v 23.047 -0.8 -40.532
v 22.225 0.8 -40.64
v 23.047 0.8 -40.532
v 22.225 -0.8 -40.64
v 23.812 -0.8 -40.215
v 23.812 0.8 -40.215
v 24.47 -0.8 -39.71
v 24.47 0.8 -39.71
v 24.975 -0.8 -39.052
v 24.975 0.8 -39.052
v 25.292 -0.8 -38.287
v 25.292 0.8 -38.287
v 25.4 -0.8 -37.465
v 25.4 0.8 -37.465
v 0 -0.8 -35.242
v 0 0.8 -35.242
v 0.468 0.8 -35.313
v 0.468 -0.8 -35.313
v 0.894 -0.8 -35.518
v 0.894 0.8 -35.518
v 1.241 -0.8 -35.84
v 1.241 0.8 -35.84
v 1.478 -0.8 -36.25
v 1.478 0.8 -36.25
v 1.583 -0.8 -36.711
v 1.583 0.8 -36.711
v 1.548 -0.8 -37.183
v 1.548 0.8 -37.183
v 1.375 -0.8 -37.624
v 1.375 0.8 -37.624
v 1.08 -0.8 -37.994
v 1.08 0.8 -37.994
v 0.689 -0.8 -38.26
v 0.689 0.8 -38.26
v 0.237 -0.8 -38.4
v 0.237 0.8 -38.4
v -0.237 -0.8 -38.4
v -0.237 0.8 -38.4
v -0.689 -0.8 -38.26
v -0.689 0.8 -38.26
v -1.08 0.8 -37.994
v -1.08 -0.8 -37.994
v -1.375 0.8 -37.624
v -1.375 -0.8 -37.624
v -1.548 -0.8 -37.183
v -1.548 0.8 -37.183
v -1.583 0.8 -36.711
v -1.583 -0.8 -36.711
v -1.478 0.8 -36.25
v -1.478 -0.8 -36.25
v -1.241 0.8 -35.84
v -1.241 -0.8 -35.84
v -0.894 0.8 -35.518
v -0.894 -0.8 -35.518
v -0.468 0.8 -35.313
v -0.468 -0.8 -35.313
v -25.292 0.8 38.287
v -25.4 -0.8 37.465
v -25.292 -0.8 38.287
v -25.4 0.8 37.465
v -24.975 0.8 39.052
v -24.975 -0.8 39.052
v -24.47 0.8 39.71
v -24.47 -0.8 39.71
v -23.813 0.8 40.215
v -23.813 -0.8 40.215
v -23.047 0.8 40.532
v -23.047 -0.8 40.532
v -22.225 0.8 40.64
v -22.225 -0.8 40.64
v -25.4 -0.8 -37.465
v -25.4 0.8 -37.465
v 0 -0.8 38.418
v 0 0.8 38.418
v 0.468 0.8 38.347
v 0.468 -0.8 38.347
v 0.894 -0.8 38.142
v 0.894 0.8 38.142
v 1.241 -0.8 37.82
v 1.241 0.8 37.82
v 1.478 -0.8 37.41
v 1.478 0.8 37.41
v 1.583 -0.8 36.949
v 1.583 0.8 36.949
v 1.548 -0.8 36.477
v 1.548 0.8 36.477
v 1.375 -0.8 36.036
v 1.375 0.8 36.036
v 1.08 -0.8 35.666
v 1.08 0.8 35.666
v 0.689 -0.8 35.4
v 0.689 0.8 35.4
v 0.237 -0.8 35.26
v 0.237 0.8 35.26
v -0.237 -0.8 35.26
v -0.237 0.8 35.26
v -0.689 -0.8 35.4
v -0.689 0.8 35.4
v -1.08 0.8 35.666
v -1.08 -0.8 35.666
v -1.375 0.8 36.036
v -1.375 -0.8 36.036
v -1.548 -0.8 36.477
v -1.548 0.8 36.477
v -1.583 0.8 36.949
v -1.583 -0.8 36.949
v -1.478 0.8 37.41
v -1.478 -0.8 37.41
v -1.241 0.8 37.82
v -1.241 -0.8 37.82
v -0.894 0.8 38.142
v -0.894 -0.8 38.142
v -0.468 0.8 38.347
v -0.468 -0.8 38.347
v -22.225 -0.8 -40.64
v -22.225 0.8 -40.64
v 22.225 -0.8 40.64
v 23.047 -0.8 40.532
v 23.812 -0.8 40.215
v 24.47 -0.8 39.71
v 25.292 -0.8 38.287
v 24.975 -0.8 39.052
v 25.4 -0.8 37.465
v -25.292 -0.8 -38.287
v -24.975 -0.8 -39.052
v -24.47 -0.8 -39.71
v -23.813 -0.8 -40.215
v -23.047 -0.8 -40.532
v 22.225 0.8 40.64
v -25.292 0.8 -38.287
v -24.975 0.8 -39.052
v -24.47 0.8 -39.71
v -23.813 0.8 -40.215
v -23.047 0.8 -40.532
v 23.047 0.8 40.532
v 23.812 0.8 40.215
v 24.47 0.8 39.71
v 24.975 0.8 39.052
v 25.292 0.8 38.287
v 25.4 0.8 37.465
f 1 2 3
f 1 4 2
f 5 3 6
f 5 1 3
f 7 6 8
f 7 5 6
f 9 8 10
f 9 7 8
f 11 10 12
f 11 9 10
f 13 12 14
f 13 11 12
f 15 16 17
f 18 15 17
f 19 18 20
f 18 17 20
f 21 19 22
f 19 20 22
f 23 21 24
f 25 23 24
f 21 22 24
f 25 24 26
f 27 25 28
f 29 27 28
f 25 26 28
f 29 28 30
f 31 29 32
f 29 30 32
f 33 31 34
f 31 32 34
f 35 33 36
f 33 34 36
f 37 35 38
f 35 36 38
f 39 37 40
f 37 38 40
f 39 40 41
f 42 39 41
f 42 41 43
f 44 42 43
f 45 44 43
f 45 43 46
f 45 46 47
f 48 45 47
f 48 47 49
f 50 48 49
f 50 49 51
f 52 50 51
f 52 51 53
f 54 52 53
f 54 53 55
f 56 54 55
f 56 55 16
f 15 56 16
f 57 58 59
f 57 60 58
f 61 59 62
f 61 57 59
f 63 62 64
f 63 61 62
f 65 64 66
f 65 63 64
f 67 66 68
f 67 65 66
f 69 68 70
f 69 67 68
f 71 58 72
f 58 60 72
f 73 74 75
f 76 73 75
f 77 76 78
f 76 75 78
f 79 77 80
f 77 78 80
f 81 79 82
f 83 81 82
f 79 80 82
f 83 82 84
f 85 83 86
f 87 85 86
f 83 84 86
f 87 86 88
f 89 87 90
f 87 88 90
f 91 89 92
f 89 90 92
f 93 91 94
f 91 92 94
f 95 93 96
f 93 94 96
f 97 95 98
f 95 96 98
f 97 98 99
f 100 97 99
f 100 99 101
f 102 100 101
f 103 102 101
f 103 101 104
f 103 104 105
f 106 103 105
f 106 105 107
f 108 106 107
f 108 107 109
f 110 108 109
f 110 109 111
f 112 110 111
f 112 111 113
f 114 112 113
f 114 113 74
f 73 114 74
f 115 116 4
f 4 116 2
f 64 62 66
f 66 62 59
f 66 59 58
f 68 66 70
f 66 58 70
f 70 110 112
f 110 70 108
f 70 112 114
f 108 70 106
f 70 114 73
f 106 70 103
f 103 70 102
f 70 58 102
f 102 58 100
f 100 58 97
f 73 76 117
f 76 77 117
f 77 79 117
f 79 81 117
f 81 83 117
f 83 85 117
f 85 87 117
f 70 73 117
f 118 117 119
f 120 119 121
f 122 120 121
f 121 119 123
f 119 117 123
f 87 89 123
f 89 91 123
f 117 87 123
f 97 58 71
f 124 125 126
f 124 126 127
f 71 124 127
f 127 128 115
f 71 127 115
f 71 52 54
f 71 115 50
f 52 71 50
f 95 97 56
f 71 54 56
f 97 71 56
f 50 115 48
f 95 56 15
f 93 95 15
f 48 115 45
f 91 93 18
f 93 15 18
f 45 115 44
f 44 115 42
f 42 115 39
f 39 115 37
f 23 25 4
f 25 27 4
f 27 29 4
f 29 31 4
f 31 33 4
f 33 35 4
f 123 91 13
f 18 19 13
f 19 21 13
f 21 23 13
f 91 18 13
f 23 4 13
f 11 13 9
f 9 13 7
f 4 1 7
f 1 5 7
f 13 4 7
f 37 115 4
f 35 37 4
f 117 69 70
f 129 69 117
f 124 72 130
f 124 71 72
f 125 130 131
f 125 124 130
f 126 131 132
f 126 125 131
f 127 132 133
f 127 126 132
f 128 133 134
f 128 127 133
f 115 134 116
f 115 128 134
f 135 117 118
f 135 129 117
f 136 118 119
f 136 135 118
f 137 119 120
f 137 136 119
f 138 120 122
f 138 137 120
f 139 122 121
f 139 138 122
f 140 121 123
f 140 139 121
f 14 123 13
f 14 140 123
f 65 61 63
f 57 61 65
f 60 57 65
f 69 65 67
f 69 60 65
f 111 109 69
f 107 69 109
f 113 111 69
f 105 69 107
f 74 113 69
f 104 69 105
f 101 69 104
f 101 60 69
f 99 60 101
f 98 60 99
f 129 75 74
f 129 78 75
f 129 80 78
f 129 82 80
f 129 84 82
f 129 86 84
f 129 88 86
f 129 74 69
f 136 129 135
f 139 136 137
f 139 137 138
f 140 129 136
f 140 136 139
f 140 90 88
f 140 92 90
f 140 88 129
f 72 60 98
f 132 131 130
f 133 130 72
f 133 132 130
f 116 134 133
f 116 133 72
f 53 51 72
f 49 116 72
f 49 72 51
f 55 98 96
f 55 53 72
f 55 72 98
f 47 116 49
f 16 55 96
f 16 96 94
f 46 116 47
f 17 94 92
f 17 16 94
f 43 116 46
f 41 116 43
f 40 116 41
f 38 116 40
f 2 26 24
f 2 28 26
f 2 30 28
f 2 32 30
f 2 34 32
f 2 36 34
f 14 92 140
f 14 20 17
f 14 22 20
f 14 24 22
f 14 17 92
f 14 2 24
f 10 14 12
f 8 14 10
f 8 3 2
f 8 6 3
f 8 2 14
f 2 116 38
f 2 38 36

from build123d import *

# Parameters (mm, degrees)
SKETCH1_W           = 50.8
SKETCH1_H           = 81.28
BOSS_EXTRUDE1_DEPTH = 0.8001
SKETCH2_R           = 1.5875
CUT_EXTRUDE1_DEPTH  = 48.951331994
FILLET1_R           = 3.175


with BuildPart() as part:
    # Sketch1 → Boss-Extrude1 (new, symmetric)
    with BuildSketch(Plane(origin=(0, 0, 0), x_dir=(1, 0, 0), z_dir=(0, 1, 0))):
        Rectangle(SKETCH1_W, SKETCH1_H)
    extrude(amount=BOSS_EXTRUDE1_DEPTH, both=True)

    # Sketch2 → Cut-Extrude1 (cut, through all)
    with BuildSketch(Plane(origin=(0, 0.8001, 0), x_dir=(1, 0, 0), z_dir=(0, 1, 0))):
        with Locations(Location((0, 36.83, 0), (0, 0, 270))):
            Circle(SKETCH2_R)
        with Locations(Location((0, -36.83, 0), (0, 0, 270))):
            Circle(SKETCH2_R)
    extrude(amount=-CUT_EXTRUDE1_DEPTH, mode=Mode.SUBTRACT)

    # Fillet1
    fillet1_edges = [part.edges().sort_by_distance(p)[0] for p in [
        (25.4, 0, 40.64),
        (-25.4, 0, 40.64),
        (-25.4, 0, -40.64),
        (25.4, 0, -40.64),
    ]]
    fillet(fillet1_edges, radius=FILLET1_R)


solid = part.part
